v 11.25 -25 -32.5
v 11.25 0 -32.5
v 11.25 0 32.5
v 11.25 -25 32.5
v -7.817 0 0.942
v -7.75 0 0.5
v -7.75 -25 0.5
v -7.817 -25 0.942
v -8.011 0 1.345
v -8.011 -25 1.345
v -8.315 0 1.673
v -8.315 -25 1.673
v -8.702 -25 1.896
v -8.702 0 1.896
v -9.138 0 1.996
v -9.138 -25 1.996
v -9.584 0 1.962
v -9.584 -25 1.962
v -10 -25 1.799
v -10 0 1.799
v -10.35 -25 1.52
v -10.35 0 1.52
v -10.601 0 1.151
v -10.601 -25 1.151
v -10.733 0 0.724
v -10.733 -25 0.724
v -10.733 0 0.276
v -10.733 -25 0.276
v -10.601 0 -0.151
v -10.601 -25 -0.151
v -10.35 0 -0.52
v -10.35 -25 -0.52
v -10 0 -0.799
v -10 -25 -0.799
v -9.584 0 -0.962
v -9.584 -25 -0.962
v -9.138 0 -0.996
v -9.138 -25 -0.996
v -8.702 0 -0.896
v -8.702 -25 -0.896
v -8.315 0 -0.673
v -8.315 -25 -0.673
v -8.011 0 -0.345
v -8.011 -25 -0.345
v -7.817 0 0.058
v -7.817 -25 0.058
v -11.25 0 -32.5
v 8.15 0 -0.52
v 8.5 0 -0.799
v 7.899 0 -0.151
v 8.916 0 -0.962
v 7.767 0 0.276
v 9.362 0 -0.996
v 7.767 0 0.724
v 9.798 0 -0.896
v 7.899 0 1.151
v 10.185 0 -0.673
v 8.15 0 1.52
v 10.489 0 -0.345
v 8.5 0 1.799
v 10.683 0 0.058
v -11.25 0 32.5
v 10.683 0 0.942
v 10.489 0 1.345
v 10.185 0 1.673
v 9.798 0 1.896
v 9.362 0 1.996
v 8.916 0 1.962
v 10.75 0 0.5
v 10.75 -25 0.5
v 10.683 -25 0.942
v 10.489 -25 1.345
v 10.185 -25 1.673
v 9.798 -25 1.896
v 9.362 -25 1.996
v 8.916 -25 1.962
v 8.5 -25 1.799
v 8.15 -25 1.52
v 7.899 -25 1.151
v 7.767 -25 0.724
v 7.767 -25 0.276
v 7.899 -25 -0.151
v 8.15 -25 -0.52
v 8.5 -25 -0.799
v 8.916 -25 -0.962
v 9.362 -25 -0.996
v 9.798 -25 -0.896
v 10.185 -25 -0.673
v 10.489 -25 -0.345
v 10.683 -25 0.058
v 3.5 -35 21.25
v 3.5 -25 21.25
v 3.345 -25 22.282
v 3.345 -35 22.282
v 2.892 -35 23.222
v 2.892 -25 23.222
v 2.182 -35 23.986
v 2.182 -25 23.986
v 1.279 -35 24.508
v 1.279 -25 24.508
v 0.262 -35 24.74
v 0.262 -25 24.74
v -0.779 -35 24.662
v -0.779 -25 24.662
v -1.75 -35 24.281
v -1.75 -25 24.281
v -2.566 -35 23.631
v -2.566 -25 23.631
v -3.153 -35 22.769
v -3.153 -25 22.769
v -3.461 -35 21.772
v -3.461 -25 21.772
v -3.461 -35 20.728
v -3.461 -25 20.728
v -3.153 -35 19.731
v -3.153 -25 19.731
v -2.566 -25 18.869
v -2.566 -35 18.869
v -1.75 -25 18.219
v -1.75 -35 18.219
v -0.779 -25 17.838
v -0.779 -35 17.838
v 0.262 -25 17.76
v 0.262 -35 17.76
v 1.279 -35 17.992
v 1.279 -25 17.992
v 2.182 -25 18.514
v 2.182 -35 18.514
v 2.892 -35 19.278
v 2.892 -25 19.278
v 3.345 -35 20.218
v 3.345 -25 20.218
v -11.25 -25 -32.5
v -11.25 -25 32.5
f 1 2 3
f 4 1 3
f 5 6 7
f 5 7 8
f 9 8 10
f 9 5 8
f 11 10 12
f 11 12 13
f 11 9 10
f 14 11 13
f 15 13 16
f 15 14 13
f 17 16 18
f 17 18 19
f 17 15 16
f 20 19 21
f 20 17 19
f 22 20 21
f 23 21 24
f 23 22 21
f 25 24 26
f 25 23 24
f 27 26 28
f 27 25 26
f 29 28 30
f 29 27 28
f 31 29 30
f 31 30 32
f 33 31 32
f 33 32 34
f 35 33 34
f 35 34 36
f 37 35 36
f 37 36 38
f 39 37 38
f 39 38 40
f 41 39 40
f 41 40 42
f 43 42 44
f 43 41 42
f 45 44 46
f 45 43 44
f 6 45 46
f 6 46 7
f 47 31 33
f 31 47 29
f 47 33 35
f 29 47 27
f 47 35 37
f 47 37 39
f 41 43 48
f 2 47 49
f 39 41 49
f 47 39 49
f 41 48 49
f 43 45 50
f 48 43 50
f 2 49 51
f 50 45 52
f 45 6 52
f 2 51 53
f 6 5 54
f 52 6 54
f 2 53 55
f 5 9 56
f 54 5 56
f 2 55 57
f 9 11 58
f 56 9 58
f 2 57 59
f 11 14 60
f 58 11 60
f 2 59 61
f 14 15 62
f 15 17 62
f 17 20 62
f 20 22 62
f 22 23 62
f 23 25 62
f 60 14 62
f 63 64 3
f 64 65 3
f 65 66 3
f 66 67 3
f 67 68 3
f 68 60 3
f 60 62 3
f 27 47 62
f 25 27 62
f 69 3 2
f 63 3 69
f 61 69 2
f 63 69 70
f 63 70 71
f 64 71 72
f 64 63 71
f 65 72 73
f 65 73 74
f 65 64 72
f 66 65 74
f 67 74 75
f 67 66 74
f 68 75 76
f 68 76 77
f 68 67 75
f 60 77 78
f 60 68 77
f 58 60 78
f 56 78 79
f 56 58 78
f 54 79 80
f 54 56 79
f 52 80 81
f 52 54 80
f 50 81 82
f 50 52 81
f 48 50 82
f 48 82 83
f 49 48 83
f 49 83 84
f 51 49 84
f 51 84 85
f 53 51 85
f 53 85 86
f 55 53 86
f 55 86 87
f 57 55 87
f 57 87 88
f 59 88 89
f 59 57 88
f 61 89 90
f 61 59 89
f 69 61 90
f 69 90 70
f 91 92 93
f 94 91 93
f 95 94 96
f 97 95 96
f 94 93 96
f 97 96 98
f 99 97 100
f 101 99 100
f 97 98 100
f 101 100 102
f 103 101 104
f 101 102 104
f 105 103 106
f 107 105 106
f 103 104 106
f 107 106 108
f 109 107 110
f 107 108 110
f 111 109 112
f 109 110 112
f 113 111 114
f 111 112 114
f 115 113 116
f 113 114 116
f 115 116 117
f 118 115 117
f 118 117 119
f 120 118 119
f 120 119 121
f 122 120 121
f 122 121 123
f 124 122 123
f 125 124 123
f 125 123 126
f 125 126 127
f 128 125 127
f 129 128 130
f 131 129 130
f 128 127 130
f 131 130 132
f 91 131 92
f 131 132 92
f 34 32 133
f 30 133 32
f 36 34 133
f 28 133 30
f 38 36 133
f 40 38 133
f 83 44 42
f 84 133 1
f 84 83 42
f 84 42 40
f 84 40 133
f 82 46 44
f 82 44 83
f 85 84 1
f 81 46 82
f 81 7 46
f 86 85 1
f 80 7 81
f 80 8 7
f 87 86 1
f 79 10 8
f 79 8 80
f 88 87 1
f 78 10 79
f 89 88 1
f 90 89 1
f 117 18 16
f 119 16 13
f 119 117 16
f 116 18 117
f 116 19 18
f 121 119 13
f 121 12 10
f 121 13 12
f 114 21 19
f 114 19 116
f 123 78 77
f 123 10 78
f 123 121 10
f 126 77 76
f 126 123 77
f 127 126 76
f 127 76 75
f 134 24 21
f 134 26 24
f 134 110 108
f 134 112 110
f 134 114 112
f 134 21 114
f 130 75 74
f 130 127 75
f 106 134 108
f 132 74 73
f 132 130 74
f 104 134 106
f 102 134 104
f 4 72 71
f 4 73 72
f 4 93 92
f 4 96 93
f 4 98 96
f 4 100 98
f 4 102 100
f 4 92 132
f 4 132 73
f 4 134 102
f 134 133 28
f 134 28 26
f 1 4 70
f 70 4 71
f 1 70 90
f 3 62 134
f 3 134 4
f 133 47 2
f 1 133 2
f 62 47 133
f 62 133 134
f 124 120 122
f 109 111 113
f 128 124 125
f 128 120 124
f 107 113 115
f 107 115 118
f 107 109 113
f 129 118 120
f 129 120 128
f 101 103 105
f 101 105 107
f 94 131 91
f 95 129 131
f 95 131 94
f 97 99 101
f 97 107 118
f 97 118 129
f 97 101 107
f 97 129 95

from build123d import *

# Parameters (mm, degrees)
F0_W     = 22.5
F0_H     = 65
F0_R     = 1.5
F1_DEPTH = 25
F2_R     = 3.5
F3_DEPTH = 10


with BuildPart() as f1:
    # F0 (on Front) → F1 (new body)
    with BuildSketch(Plane.XZ):
        Rectangle(F0_W, F0_H)
        with Locations((-9.25, 0.5)):
            Circle(F0_R, mode=Mode.SUBTRACT)
        with Locations((9.25, 0.5)):
            Circle(F0_R, mode=Mode.SUBTRACT)
    extrude(amount=F1_DEPTH)

    # F2 (on face) → F3 (join)
    with BuildSketch(Plane.XZ.offset(25)):
        with Locations((0, 21.25)):
            Circle(F2_R)
    extrude(amount=F3_DEPTH)


solid = f1.part
